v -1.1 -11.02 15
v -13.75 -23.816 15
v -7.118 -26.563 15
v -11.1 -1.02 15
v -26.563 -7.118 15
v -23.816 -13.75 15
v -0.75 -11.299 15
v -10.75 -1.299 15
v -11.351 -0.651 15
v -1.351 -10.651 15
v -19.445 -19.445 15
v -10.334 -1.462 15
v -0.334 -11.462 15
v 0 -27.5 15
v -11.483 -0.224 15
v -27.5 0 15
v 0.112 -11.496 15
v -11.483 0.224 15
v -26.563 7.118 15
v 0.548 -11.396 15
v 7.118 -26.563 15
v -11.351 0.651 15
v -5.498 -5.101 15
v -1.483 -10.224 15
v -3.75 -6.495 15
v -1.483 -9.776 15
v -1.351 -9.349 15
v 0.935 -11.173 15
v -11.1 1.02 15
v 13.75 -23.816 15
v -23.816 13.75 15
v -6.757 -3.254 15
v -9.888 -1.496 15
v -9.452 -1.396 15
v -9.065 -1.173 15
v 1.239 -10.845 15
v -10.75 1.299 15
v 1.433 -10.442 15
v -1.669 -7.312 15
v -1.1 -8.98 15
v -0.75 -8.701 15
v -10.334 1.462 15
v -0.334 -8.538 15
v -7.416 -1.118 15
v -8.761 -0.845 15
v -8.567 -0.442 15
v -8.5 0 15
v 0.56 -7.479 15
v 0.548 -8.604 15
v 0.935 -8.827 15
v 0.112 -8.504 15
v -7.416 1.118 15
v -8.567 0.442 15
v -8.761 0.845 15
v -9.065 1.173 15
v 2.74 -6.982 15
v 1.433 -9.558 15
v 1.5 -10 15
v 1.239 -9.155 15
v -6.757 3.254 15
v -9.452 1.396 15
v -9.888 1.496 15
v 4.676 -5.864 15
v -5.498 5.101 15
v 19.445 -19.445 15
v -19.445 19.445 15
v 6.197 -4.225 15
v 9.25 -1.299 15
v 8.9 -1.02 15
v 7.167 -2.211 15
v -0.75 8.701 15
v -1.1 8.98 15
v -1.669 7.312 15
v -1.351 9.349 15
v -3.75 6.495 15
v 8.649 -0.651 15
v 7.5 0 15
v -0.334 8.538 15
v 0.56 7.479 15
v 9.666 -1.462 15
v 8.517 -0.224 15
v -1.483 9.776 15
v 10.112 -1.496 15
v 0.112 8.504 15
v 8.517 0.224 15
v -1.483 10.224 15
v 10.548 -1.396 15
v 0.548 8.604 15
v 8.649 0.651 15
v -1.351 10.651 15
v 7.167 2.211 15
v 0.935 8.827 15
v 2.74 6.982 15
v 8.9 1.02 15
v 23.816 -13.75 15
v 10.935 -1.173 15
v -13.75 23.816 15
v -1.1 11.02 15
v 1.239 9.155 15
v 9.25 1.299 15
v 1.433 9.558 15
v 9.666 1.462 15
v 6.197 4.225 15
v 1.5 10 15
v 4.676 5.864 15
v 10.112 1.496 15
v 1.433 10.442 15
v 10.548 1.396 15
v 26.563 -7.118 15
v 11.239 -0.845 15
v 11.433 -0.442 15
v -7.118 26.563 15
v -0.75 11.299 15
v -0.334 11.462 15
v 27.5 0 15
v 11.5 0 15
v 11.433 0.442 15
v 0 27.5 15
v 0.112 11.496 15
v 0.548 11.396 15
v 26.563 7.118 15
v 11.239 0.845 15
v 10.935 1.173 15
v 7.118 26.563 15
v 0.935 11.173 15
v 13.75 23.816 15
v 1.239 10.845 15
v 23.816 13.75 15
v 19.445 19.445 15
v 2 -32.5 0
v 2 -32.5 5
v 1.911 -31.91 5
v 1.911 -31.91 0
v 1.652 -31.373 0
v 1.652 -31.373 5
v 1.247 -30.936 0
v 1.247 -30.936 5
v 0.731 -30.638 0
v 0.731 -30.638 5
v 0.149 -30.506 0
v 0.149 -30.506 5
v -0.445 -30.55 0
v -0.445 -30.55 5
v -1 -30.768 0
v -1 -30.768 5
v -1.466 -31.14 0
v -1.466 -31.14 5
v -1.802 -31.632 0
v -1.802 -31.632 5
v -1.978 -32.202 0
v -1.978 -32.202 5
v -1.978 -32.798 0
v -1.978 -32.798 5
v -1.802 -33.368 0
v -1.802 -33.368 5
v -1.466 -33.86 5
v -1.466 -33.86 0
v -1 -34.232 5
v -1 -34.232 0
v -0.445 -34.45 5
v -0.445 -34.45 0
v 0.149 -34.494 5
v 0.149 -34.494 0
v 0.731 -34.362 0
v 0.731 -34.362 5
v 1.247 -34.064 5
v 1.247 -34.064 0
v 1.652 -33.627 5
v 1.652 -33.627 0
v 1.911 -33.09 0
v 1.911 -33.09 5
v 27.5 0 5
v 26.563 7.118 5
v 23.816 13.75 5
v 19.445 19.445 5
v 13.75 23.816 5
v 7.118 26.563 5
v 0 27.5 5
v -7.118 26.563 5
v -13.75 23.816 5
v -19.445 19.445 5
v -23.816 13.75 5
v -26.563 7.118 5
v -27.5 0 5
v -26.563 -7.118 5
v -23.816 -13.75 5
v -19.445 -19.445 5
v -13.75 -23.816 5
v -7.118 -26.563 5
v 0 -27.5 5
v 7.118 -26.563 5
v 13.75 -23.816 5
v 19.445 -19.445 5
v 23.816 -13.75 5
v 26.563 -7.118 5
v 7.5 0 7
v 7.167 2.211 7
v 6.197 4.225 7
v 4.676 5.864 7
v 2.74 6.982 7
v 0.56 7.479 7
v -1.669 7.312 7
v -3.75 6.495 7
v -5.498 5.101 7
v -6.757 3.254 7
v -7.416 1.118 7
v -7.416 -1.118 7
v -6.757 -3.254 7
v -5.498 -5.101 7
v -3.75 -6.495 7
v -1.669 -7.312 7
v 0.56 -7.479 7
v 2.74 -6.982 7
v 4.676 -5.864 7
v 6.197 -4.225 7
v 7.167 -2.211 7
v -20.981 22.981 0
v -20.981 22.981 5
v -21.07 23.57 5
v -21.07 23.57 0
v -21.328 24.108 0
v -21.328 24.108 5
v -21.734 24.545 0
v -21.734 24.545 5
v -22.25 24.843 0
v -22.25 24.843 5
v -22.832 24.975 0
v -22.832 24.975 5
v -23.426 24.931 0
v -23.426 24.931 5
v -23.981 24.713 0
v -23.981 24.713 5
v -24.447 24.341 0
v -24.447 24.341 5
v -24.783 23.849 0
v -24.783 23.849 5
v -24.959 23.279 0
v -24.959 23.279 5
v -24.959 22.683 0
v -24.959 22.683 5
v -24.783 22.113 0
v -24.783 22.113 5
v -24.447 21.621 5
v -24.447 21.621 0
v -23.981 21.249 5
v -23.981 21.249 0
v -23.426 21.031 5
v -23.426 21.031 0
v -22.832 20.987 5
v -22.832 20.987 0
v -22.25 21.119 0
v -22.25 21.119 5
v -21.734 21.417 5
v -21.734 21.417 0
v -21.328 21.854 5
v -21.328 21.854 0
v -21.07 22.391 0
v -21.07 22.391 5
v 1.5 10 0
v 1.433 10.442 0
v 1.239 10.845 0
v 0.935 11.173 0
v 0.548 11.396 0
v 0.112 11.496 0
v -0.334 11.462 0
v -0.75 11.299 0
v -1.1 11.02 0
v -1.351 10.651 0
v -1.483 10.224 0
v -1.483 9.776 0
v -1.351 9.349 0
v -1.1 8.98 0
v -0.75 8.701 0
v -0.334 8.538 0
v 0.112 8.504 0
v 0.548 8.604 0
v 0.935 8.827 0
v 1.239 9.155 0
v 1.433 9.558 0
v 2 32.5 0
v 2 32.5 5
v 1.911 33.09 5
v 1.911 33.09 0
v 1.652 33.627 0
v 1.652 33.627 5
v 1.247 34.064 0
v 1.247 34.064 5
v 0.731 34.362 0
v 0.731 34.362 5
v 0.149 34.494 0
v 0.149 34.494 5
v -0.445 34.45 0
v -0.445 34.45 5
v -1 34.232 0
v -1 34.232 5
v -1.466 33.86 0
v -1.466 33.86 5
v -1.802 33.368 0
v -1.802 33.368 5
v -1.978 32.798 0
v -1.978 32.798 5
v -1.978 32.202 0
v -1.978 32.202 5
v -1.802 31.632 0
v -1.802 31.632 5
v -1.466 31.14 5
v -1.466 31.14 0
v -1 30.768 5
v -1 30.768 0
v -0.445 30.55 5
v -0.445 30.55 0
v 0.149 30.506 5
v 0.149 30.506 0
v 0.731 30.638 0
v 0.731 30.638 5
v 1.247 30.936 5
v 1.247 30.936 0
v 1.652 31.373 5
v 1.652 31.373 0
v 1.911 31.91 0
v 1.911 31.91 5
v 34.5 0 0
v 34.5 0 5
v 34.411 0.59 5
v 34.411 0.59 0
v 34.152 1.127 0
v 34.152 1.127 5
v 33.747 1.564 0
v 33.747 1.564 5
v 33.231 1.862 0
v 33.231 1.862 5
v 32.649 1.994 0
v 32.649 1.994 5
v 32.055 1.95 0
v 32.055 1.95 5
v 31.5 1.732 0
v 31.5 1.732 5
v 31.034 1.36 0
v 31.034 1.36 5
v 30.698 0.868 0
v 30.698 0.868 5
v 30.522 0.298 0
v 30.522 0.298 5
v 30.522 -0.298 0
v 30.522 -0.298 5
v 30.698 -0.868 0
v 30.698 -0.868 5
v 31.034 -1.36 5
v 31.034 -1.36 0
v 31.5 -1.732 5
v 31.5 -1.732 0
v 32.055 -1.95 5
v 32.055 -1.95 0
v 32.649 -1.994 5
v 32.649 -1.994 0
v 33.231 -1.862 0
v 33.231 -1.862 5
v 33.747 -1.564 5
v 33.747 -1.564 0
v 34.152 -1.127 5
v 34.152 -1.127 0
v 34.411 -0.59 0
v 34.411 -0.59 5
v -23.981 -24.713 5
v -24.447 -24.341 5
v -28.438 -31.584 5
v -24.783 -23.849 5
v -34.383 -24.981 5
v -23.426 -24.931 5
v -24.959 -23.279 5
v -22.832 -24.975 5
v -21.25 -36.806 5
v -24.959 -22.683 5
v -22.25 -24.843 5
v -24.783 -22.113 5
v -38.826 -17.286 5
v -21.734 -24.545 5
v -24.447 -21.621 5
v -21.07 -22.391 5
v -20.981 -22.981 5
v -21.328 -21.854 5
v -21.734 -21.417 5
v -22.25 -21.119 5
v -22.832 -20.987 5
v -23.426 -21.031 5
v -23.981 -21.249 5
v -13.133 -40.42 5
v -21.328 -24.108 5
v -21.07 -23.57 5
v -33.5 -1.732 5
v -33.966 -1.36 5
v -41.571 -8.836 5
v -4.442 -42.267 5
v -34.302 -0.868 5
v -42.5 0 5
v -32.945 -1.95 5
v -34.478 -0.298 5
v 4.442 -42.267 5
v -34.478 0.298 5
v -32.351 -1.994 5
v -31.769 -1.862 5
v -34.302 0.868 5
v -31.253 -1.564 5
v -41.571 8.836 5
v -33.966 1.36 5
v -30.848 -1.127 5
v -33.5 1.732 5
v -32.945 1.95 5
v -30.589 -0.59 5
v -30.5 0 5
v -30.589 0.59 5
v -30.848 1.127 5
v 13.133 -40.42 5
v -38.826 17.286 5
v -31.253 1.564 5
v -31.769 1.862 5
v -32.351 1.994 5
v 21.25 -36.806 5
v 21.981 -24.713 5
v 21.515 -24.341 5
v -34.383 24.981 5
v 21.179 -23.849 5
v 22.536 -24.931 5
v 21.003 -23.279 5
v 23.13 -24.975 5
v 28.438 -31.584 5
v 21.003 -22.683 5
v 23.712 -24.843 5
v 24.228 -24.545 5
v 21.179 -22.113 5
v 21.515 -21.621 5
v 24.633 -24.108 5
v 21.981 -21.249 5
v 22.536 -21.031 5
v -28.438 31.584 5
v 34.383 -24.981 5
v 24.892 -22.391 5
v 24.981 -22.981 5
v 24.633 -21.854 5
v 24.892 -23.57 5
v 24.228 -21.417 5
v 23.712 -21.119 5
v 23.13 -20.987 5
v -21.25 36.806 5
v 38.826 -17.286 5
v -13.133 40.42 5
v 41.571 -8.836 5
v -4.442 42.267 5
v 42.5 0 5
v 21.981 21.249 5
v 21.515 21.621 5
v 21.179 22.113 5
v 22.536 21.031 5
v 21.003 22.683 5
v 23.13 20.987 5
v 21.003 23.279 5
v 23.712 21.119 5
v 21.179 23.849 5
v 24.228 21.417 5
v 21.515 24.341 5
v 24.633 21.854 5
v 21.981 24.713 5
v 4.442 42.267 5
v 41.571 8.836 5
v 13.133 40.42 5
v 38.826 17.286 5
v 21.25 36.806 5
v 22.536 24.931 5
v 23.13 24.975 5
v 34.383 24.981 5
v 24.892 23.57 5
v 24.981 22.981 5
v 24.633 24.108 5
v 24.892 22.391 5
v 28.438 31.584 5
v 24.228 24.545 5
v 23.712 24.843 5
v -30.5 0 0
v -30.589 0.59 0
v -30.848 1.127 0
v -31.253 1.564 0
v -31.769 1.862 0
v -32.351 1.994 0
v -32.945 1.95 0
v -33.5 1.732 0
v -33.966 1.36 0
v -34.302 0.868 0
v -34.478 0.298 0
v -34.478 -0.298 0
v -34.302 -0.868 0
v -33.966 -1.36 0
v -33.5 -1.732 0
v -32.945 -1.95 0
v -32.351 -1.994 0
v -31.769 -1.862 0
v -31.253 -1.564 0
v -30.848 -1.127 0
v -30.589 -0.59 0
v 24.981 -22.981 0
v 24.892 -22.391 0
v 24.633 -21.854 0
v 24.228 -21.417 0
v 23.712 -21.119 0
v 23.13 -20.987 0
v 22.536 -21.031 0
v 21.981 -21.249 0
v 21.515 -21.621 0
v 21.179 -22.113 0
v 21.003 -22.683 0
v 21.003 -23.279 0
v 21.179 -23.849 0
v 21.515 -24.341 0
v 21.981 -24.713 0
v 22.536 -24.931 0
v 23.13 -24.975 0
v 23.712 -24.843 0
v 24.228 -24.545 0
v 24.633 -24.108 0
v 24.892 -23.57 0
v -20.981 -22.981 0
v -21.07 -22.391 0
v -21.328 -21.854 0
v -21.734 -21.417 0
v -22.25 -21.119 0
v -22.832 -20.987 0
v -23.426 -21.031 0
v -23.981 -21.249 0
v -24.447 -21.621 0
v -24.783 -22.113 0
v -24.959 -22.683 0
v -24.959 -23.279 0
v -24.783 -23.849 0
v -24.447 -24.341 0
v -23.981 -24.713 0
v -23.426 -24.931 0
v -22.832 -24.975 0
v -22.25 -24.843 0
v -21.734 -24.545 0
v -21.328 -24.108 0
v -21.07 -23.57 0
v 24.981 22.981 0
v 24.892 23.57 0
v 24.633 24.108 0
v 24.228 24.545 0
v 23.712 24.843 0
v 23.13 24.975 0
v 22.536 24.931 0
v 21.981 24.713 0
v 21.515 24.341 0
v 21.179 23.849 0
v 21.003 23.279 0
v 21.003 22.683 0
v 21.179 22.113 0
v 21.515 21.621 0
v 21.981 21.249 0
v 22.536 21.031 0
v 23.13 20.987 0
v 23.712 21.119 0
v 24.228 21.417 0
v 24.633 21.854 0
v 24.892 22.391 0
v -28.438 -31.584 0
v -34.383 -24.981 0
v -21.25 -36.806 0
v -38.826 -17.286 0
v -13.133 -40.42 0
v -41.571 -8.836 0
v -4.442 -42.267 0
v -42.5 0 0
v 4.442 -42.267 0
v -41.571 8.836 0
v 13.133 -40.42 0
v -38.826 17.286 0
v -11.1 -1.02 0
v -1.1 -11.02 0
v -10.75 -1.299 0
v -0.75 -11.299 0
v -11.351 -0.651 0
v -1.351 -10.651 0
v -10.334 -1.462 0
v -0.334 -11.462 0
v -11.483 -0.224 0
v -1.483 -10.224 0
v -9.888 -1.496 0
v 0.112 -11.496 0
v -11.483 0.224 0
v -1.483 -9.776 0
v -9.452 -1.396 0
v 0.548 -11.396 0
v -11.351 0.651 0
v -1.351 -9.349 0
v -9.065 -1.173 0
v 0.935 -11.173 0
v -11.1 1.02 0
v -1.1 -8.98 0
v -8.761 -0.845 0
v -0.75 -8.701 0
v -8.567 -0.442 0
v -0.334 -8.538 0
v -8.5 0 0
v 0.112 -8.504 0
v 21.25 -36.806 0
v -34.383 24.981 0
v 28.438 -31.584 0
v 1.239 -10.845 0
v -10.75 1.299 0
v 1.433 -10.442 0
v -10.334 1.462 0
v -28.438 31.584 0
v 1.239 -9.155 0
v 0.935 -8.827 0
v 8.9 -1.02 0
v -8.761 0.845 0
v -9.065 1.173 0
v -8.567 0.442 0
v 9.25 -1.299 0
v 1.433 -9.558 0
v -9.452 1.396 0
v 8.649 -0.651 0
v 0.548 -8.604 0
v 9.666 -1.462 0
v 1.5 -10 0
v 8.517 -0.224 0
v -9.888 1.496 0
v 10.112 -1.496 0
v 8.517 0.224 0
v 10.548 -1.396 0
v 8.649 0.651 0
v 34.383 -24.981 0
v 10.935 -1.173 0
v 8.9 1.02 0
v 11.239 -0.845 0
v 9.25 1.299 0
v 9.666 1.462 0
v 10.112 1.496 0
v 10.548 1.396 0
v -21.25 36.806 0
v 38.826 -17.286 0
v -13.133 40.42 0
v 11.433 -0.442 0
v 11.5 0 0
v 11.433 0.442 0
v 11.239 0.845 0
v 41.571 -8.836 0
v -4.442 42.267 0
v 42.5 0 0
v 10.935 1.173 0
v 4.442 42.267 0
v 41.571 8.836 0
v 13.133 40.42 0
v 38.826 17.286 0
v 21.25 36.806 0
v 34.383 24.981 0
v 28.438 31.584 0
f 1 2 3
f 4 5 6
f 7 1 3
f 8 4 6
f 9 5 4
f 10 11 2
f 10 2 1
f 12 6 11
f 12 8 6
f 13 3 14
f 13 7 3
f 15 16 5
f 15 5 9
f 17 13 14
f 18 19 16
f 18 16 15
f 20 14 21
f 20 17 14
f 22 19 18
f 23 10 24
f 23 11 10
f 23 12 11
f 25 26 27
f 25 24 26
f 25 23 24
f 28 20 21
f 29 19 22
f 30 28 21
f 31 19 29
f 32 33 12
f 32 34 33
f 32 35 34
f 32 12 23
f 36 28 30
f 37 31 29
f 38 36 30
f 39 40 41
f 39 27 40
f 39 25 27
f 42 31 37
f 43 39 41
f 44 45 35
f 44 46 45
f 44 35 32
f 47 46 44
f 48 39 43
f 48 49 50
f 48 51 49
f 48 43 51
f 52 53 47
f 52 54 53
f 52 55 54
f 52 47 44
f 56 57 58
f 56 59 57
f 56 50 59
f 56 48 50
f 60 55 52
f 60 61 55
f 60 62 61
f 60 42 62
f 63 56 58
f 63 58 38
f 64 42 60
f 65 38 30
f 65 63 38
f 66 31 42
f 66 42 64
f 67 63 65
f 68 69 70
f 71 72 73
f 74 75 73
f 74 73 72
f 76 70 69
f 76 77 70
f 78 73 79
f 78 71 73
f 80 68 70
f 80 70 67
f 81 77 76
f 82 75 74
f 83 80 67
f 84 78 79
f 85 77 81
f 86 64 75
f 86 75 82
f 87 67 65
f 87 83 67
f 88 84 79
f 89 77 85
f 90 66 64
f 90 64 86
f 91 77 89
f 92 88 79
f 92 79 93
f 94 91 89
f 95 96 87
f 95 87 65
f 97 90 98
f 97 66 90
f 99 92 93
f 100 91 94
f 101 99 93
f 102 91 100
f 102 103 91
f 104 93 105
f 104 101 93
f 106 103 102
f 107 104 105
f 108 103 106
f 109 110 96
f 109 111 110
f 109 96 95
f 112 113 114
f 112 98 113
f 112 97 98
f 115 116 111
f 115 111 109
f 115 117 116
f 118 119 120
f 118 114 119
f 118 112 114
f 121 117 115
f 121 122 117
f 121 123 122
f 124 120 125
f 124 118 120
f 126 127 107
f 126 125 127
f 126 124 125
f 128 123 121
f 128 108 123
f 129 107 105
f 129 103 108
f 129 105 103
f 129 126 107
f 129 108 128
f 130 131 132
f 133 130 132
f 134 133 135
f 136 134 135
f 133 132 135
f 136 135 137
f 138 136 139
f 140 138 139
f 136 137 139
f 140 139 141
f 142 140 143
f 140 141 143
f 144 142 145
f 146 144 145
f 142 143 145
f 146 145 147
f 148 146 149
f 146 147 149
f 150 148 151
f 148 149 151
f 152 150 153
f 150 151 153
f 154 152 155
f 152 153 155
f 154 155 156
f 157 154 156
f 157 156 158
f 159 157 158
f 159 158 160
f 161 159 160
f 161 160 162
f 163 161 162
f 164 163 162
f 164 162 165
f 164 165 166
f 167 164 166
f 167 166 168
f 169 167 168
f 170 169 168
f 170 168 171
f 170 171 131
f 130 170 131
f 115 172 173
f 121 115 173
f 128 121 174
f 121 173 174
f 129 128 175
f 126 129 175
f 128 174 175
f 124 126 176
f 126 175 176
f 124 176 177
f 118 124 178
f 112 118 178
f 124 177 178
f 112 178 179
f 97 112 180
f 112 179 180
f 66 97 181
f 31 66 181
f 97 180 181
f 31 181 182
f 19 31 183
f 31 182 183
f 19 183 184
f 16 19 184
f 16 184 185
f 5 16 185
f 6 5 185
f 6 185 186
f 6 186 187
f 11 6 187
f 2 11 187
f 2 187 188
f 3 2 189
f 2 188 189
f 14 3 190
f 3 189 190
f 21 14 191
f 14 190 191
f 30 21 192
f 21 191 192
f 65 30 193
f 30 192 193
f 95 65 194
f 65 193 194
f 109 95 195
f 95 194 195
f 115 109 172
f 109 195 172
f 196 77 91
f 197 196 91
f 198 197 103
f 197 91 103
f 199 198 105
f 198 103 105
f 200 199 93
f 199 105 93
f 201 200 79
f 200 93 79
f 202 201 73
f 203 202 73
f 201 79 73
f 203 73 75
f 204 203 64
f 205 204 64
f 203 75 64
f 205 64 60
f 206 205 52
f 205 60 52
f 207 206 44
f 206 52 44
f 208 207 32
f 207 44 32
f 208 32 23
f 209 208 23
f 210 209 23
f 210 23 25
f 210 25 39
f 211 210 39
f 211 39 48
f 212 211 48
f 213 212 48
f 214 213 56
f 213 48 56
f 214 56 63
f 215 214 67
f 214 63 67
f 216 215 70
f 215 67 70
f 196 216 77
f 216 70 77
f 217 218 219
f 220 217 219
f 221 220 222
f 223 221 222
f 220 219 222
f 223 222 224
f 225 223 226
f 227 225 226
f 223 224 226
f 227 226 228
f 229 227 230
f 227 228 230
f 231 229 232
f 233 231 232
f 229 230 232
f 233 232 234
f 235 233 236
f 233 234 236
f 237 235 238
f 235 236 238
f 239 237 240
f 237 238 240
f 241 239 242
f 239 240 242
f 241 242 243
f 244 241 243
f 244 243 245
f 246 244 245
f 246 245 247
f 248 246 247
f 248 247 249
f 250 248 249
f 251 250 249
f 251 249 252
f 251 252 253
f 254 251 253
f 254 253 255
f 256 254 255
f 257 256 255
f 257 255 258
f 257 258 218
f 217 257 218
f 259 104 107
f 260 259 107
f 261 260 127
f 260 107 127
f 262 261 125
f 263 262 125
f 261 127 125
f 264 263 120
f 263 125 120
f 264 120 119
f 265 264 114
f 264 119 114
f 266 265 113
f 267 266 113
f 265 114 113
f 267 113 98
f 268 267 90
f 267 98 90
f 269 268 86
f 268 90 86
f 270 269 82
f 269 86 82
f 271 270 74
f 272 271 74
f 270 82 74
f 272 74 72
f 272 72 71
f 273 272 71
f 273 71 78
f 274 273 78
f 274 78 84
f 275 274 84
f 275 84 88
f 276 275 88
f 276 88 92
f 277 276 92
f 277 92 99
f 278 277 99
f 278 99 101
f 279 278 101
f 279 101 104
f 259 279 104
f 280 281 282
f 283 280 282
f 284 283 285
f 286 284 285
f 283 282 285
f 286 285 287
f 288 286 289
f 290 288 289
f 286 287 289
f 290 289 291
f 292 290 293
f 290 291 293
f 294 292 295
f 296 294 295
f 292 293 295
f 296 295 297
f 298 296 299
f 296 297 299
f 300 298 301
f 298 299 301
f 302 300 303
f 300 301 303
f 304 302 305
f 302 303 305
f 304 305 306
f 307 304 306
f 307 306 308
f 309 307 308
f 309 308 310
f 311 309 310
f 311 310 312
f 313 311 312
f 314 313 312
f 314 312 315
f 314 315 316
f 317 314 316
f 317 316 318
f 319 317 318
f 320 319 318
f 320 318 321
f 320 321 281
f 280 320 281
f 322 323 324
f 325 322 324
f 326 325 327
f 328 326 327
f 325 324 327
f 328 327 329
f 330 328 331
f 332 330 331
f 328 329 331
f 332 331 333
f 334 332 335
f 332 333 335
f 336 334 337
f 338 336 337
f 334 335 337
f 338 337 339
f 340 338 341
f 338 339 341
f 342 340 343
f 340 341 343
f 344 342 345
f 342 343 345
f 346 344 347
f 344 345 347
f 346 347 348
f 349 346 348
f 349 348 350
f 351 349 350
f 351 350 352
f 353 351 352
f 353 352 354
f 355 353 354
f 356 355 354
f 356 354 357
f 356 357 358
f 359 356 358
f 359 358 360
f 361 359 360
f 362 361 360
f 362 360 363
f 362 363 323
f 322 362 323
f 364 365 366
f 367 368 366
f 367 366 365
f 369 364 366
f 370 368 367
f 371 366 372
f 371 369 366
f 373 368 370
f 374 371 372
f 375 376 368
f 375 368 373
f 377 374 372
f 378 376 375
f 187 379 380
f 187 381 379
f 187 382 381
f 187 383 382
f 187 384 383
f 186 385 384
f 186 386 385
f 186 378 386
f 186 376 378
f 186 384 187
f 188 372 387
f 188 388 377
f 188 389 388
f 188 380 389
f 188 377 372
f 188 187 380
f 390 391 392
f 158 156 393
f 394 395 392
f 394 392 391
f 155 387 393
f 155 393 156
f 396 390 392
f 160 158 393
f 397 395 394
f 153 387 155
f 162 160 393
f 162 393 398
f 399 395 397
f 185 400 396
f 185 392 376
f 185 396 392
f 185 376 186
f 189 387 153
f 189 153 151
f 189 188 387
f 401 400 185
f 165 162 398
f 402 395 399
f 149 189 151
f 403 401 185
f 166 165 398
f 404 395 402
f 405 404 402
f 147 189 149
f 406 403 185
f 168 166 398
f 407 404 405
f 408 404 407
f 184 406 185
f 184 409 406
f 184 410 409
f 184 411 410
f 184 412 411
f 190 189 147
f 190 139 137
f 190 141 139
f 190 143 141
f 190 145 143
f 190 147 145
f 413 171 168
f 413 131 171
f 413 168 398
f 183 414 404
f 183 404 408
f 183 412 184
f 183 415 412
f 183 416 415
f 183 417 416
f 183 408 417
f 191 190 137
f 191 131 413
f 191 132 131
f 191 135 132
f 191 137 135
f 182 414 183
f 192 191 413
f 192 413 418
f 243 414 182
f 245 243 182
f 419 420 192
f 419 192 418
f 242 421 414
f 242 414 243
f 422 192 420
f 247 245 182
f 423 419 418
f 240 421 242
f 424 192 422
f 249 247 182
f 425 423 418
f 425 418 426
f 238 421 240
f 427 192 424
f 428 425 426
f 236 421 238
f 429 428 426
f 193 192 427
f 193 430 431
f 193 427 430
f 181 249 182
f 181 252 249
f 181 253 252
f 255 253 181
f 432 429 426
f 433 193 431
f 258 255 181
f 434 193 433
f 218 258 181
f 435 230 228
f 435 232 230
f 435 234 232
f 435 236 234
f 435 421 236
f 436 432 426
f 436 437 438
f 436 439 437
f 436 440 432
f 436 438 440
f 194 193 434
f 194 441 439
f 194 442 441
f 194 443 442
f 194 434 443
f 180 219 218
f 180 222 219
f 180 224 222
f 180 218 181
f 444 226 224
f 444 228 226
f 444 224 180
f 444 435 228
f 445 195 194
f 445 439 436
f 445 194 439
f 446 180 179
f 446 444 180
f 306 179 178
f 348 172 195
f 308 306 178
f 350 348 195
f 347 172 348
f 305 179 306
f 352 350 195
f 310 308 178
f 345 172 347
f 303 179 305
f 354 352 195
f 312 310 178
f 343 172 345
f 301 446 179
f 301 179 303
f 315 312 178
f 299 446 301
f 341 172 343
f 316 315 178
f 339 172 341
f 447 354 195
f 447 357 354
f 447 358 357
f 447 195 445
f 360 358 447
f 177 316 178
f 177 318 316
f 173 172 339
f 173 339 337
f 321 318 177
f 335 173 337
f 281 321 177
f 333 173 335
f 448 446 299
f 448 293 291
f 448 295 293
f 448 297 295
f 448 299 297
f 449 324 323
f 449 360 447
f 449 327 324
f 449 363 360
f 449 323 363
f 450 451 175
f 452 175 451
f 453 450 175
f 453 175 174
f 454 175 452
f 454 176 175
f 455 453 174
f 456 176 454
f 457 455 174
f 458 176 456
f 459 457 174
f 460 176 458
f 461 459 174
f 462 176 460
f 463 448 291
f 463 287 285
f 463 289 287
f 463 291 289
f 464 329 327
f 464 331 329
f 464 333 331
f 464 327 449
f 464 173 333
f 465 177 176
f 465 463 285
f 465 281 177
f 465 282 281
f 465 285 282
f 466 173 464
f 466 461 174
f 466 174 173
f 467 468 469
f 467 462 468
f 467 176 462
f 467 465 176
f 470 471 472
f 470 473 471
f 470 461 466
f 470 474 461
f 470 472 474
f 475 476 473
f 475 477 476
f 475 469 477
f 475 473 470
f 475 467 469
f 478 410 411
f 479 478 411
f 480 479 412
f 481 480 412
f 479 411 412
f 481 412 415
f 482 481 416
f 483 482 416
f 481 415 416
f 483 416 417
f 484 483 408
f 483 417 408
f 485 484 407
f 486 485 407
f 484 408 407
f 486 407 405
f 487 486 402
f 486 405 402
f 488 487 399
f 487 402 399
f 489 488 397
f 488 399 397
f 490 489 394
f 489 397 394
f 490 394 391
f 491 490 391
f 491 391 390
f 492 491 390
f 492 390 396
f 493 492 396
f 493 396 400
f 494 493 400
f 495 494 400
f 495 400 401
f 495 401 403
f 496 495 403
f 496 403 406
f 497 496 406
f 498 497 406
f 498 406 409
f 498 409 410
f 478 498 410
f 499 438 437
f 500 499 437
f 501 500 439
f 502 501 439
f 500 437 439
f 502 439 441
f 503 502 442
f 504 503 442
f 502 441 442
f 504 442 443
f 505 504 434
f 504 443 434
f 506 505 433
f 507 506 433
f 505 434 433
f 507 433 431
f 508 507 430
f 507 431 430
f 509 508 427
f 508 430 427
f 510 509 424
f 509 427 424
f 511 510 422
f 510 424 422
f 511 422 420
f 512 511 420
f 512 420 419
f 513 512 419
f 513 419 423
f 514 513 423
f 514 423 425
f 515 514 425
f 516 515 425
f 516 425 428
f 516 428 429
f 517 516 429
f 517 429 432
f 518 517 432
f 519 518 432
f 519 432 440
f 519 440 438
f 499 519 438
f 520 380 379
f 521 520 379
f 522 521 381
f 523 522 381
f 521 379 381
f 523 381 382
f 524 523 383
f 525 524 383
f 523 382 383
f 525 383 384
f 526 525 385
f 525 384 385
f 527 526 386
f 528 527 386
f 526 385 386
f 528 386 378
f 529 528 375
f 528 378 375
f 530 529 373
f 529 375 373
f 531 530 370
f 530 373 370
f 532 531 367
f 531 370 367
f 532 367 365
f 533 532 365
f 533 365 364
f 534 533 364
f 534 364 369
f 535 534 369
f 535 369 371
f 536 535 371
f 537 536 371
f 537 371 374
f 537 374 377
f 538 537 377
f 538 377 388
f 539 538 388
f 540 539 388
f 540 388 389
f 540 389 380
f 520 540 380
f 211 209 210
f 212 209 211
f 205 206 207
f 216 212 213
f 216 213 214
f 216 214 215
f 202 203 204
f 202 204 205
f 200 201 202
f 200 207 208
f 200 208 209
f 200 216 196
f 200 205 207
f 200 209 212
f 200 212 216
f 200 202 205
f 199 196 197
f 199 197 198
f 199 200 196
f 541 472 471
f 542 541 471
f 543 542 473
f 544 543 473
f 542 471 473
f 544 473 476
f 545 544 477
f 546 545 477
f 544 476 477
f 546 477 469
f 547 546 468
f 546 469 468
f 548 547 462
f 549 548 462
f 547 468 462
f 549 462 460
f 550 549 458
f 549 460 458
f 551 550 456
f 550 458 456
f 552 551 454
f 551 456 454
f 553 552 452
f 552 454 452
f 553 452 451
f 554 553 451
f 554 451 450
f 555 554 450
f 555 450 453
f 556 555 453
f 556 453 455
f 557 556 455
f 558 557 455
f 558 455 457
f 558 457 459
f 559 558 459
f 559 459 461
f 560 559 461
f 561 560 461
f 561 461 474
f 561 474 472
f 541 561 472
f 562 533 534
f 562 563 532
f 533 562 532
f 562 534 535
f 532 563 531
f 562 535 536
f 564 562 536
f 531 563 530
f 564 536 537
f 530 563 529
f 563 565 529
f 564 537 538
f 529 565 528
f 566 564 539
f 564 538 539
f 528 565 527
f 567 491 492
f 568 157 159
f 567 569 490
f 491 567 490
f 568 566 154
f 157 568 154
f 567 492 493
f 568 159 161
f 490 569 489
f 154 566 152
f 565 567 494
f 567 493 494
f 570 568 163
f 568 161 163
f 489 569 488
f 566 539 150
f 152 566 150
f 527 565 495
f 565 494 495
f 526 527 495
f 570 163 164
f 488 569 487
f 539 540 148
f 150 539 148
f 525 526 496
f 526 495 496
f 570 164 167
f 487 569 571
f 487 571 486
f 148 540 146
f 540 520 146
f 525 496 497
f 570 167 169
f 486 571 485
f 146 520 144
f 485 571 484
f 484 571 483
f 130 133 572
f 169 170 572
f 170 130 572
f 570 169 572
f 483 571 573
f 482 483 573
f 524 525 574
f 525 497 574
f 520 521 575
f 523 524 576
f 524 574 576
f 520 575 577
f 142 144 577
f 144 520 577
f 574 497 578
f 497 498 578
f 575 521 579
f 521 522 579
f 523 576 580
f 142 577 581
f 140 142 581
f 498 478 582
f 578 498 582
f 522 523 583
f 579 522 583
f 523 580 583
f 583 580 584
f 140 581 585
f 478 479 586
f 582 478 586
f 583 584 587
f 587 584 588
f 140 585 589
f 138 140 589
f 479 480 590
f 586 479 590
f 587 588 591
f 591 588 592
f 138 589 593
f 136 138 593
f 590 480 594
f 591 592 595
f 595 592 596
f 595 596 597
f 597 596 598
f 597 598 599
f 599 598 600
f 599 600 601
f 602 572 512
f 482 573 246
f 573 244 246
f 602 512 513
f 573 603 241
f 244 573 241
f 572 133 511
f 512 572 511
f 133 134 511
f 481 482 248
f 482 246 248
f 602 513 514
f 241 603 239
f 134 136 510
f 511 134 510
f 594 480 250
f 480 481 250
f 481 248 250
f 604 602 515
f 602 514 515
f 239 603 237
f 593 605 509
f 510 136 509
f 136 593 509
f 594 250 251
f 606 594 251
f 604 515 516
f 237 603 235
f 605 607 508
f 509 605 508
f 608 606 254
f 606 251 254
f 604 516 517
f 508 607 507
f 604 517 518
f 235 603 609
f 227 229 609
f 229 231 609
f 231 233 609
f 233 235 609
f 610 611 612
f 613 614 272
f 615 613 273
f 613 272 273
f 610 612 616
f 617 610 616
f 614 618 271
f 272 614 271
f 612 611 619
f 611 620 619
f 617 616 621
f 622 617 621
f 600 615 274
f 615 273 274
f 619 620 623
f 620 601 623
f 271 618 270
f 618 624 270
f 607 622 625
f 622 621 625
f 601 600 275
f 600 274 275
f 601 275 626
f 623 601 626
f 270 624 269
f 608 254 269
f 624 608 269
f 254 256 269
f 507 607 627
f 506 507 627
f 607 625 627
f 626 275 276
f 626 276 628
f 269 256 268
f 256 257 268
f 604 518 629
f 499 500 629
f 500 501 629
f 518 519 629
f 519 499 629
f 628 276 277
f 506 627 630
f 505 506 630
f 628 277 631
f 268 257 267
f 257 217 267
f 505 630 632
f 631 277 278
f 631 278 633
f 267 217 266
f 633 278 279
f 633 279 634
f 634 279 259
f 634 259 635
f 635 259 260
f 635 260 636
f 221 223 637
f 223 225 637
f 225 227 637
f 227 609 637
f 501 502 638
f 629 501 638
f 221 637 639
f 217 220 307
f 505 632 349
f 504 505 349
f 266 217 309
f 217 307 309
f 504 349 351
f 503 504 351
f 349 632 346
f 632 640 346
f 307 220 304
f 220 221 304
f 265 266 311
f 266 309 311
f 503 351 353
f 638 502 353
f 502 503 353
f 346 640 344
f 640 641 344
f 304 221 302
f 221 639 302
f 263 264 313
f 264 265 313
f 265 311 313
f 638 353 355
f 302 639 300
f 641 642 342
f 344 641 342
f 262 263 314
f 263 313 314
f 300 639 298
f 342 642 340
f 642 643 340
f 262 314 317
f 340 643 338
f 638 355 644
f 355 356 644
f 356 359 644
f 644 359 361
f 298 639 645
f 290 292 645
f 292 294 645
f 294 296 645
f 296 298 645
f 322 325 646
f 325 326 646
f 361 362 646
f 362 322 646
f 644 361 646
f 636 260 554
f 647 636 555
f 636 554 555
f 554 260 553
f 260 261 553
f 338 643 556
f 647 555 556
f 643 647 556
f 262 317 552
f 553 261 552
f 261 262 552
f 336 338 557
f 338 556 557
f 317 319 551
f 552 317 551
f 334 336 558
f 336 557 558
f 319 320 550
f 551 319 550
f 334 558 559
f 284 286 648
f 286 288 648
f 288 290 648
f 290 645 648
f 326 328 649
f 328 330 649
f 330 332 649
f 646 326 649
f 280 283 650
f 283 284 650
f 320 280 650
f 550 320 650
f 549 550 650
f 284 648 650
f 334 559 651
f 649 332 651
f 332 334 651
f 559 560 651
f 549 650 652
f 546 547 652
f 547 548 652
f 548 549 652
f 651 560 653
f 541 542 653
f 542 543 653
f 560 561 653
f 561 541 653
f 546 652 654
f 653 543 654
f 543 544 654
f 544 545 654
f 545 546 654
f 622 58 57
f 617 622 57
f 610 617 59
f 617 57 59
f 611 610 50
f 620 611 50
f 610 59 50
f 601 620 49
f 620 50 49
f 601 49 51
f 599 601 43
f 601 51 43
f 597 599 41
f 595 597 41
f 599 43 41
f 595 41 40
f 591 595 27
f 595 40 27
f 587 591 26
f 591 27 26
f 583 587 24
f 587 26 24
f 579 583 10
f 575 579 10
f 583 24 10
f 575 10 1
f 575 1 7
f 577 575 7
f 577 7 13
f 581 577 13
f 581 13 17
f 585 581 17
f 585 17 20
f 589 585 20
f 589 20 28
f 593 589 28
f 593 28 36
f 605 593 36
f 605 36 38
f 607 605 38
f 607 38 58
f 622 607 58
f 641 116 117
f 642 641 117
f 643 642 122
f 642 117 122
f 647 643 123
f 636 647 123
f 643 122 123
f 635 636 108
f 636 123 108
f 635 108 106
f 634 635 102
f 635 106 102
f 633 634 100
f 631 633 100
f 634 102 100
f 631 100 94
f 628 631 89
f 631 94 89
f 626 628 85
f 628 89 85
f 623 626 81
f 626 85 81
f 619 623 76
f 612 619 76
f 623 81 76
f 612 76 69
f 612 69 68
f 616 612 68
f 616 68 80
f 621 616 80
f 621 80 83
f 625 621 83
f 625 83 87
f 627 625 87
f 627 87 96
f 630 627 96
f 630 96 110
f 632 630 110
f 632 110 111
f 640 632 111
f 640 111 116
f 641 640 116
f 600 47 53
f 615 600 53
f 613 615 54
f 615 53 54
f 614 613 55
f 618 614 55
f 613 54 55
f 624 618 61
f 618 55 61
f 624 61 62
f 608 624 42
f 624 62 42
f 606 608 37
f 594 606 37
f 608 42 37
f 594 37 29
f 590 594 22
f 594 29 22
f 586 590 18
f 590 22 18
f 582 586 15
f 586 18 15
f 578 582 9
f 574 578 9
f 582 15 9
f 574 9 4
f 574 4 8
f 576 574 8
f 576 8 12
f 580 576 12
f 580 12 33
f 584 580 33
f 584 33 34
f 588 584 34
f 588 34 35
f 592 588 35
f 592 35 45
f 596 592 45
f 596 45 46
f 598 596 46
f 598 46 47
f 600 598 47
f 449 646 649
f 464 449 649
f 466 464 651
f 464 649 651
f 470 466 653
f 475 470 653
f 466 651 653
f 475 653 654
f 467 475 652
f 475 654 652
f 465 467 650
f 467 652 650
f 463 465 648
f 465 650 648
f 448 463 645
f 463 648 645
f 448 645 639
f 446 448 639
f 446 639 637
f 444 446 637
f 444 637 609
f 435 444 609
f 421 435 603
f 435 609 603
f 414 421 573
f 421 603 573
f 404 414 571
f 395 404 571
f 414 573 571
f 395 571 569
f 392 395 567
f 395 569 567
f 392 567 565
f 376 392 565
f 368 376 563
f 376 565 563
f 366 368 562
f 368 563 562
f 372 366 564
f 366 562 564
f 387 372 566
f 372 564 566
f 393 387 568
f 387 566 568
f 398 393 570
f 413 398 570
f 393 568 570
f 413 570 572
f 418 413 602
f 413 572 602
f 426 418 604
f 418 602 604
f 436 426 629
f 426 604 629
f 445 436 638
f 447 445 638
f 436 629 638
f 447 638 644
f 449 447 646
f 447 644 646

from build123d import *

# Parameters (mm, degrees)
SKETCH1_R           = 42.5
BOSS_EXTRUDE1_DEPTH = 5
SKETCH2_R           = 27.5
BOSS_EXTRUDE2_DEPTH = 10
SKETCH3_R           = 7.5
CUT_EXTRUDE1_DEPTH  = 8
SKETCH4_R           = 1.5
CUT_EXTRUDE2_DEPTH  = 16
SKETCH5_R           = 2
CUT_EXTRUDE3_DEPTH  = 6


with BuildPart() as part:
    # Sketch1 → Boss-Extrude1 (new body)
    with BuildSketch(Plane.XY):
        Circle(SKETCH1_R)
    extrude(amount=BOSS_EXTRUDE1_DEPTH)

    # Sketch2 → Boss-Extrude2 (add)
    with BuildSketch(Plane.XY.offset(5)):
        Circle(SKETCH2_R)
    extrude(amount=BOSS_EXTRUDE2_DEPTH)

    # Sketch3 → Cut-Extrude1 (cut)
    with BuildSketch(Plane.XY.offset(15)):
        Circle(SKETCH3_R)
    extrude(amount=-CUT_EXTRUDE1_DEPTH, mode=Mode.SUBTRACT)

    # Sketch4 → Cut-Extrude2 (cut, through all)
    with BuildSketch(Plane.XY.offset(15)):
        with Locations((0, 10)):
            Circle(SKETCH4_R)
        with Locations((10, 0)):
            Circle(SKETCH4_R)
        with Locations((0, -10)):
            Circle(SKETCH4_R)
        with Locations((-10, 0)):
            Circle(SKETCH4_R)
    extrude(amount=-CUT_EXTRUDE2_DEPTH, mode=Mode.SUBTRACT)

    # Sketch5 → Cut-Extrude3 (cut, through all)
    with BuildSketch(Plane.XY.offset(5)):
        with Locations((0, 32.5)):
            Circle(SKETCH5_R)
        with Locations((22.980970389, 22.980970389)):
            Circle(SKETCH5_R)
        with Locations((32.5, 0)):
            Circle(SKETCH5_R)
        with Locations((22.980970389, -22.980970389)):
            Circle(SKETCH5_R)
        with Locations((0, -32.5)):
            Circle(SKETCH5_R)
        with Locations((-22.980970389, -22.980970389)):
            Circle(SKETCH5_R)
        with Locations((-32.5, 0)):
            Circle(SKETCH5_R)
        with Locations((-22.980970389, 22.980970389)):
            Circle(SKETCH5_R)
    extrude(amount=-CUT_EXTRUDE3_DEPTH, mode=Mode.SUBTRACT)


solid = part.part
